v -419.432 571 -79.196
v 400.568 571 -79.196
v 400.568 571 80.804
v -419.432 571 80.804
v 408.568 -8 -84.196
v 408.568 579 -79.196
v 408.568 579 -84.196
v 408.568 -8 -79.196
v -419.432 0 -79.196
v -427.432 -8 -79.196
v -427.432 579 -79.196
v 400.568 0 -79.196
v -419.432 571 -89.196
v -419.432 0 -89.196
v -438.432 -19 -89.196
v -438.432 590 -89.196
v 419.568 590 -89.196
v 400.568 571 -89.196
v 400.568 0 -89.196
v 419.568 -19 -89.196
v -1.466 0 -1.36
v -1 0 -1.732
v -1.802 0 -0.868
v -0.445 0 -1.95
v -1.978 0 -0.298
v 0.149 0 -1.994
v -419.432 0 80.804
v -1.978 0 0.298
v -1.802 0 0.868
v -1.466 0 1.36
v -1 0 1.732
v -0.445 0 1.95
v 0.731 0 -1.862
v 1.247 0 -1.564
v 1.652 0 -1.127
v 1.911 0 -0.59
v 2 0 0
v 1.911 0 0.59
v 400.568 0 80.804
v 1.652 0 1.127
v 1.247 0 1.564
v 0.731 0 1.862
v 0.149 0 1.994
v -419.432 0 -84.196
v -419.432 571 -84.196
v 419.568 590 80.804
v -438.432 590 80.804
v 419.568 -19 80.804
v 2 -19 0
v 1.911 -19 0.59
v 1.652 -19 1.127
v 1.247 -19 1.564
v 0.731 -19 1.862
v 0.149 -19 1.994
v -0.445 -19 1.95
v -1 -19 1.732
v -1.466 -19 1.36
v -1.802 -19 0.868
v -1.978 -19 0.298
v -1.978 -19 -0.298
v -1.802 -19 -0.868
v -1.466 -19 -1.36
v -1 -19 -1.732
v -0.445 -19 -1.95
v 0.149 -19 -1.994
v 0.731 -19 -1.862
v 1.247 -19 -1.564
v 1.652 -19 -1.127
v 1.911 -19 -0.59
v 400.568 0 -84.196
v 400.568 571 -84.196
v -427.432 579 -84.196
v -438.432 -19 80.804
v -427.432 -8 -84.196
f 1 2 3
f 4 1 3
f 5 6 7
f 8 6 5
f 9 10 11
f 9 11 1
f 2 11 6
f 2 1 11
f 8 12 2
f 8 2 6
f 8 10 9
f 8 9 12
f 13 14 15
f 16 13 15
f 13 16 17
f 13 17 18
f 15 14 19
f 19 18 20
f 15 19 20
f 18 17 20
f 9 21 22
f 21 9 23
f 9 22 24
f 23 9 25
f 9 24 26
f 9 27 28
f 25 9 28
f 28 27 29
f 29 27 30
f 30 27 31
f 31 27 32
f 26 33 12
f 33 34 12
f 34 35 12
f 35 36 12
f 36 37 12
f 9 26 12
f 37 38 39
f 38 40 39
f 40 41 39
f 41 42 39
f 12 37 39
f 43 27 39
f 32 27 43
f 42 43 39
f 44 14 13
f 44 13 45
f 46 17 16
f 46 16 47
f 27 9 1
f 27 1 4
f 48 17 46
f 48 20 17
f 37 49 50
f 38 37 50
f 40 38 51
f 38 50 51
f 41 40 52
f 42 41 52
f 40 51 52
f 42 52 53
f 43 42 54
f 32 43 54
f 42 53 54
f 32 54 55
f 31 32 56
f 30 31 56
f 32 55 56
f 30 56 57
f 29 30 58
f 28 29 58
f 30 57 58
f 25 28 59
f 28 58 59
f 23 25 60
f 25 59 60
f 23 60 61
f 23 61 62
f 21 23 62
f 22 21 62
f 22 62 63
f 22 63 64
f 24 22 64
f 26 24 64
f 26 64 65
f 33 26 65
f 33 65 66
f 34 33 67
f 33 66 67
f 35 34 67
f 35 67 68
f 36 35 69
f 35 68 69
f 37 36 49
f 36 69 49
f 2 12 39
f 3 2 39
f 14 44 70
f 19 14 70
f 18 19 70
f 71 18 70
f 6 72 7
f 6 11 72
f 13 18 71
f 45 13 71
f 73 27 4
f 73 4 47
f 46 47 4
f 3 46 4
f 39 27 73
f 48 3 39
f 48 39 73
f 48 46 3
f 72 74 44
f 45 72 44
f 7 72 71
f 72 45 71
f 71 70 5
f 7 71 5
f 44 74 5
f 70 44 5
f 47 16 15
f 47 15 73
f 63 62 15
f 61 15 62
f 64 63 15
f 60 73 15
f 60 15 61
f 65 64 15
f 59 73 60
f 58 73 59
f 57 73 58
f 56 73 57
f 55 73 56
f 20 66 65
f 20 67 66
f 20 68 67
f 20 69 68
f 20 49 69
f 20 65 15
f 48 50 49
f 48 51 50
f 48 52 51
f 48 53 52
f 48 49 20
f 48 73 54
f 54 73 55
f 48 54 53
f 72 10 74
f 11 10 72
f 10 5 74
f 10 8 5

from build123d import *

# Parameters (mm, degrees)
F0_W      = 858
F0_H      = 170
F1_DEPTH  = 19
F2_W      = 19
F2_H      = 170
F3_DEPTH  = 590
F4_W      = 19
F4_H      = 170
F5_DEPTH  = 824
F6_W      = 820
F6_H      = 5
F7_DEPTH  = 8
F8_W      = 820
F8_H      = 5
F9_DEPTH  = 8
F11_DEPTH = 8
F13_DEPTH = 8
F14_R     = 2
F15_DEPTH = 19


with BuildPart() as f1:
    # F0 (on Front) → F1 (new body)
    with BuildSketch(Plane.XZ):
        with Locations((-9.432035, -4.196442)):
            Rectangle(F0_W, F0_H)
    extrude(amount=F1_DEPTH)

    # F2 (on face) → F3 (join)
    with BuildSketch(Plane(origin=(0, 0, 0), x_dir=(-1, 0, 0), z_dir=(0, 1, 0))):
        with Locations((-410.067965, -4.196442)):
            Rectangle(F2_W, F2_H)
        with Locations((428.932035, -4.196442)):
            Rectangle(F2_W, F2_H)
    extrude(amount=F3_DEPTH)

    # F4 (on face) → F5 (join)
    with BuildSketch(Plane(origin=(400.567965, 0, 0), x_dir=(0, -1, 0), z_dir=(-1, 0, 0))):
        with Locations((-580.5, -4.196442)):
            Rectangle(F4_W, F4_H)
    extrude(amount=F5_DEPTH)

    # F6 (on face) → F7 (cut)
    with BuildSketch(Plane.XZ.offset(-571)):
        with Locations((-9.432035, -81.696442)):
            Rectangle(F6_W, F6_H)
    extrude(amount=-F7_DEPTH, mode=Mode.SUBTRACT)

    # F8 (on face) → F9 (cut)
    with BuildSketch(Plane(origin=(0, 0, 0), x_dir=(-1, 0, 0), z_dir=(0, 1, 0))):
        with Locations((9.432035, -81.696442)):
            Rectangle(F8_W, F8_H)
    extrude(amount=-F9_DEPTH, mode=Mode.SUBTRACT)

    # F10 (on face) → F11 (cut)
    with BuildSketch(Plane.YZ.offset(-419.432035)):
        Polygon((0, -79.196442), (-8, -79.196442), (-8, -84.196442), (0, -84.196442), (571, -84.196442), (579, -84.196442), (579, -79.196442), (571, -79.196442), align=None)
    extrude(amount=-F11_DEPTH, mode=Mode.SUBTRACT)

    # F12 (on face) → F13 (cut)
    with BuildSketch(Plane(origin=(400.567965, 0, 0), x_dir=(0, -1, 0), z_dir=(-1, 0, 0))):
        Polygon((8, -84.196442), (8, -79.196442), (0, -79.196442), (-571, -79.196442), (-579, -79.196442), (-579, -84.196442), (-571, -84.196442), (0, -84.196442), align=None)
    extrude(amount=-F13_DEPTH, mode=Mode.SUBTRACT)

    # F14 (on face) → F15 (cut)
    with BuildSketch(Plane.XZ.offset(19)):
        Circle(F14_R)
    extrude(amount=-F15_DEPTH, mode=Mode.SUBTRACT)


solid = f1.part
